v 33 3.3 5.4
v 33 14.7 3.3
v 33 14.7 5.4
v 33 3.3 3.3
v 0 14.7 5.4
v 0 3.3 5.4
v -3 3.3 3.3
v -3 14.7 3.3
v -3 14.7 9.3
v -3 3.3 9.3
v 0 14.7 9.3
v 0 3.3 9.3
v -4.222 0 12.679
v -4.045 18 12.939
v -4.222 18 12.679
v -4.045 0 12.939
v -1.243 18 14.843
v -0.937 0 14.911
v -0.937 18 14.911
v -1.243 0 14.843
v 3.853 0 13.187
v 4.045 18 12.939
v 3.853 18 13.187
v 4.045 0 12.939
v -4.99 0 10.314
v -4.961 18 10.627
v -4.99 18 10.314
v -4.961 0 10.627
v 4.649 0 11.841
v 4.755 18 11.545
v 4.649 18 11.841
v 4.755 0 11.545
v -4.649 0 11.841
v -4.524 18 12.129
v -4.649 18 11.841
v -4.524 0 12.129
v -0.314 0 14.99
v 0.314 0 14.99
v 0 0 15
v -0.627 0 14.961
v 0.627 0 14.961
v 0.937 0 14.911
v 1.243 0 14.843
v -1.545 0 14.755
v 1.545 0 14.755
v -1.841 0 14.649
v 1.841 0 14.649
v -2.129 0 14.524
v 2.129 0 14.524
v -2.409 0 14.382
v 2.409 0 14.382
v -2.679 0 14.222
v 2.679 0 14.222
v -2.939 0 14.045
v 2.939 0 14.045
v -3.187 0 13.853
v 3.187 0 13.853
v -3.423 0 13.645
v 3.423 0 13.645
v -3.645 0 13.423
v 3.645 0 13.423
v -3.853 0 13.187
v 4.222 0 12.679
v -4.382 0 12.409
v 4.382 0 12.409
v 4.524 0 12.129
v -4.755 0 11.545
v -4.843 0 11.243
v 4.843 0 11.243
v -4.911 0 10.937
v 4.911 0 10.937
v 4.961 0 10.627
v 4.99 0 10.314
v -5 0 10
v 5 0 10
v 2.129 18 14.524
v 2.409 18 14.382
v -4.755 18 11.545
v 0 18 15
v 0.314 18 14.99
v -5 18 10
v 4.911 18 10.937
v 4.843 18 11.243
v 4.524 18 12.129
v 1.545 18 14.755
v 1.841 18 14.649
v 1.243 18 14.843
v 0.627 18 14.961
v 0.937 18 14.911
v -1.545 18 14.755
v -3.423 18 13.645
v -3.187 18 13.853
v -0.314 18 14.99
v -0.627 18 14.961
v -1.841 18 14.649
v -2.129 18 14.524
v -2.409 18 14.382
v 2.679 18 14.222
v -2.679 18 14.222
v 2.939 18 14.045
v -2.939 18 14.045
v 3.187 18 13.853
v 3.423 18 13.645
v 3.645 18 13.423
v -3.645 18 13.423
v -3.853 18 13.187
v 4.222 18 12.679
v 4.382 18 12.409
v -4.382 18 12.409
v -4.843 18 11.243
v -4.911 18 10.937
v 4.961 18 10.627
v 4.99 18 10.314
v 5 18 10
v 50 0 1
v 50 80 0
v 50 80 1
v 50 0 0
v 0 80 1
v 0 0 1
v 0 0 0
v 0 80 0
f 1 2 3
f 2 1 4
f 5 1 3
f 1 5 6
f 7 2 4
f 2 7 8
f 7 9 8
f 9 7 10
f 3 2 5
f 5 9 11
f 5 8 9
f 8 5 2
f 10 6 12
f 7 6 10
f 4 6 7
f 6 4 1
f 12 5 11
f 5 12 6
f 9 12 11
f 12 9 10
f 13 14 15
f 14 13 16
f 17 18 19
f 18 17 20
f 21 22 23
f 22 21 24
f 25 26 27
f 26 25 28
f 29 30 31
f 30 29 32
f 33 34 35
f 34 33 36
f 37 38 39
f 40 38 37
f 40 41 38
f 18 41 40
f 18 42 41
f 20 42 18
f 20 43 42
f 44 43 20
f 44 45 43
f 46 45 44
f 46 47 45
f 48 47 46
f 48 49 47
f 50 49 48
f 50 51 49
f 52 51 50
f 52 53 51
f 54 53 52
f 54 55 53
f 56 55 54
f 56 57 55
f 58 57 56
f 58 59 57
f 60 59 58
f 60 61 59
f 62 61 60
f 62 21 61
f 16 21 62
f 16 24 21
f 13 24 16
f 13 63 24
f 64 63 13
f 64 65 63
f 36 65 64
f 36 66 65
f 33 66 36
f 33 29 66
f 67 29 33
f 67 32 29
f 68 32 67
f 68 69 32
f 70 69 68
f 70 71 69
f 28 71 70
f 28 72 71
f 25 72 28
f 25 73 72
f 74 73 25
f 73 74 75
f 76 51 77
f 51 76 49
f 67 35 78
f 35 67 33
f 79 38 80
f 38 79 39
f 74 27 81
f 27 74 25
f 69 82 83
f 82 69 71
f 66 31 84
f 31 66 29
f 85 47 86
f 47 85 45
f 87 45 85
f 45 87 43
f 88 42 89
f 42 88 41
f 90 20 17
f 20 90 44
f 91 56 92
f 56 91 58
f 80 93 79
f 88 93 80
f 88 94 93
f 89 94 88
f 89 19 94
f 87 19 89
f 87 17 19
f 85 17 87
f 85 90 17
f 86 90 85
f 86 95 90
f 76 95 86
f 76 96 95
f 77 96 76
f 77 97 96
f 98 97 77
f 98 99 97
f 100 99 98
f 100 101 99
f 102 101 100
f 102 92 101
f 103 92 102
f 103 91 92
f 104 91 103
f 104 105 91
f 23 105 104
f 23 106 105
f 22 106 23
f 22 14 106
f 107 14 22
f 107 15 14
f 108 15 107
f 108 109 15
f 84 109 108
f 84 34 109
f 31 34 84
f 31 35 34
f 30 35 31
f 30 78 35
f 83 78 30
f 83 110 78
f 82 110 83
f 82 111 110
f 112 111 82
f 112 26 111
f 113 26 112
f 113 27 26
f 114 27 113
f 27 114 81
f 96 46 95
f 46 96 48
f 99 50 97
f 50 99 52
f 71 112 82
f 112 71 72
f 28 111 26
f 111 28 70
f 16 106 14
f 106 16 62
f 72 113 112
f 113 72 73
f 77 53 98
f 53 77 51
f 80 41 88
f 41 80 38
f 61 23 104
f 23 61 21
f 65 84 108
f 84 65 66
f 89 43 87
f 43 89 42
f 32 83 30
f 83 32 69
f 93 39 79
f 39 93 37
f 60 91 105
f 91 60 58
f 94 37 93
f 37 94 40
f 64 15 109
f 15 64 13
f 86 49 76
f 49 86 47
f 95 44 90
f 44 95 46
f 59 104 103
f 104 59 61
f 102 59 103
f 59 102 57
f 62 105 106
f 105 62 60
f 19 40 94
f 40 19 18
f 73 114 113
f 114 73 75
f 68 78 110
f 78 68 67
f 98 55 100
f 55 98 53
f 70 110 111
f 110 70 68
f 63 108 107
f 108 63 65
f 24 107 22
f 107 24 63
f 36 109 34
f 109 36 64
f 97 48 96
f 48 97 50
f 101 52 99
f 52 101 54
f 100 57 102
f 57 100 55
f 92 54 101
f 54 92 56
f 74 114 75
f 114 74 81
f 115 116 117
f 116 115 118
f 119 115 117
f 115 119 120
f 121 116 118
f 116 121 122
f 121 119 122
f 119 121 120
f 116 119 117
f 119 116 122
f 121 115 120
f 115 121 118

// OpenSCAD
module outer_box(){
 	cube([6, 6, 0.5]);
 
	//right wall
 	translate([0, 0, .5])
 		cube([6, 0.5, 2.5]);
 	//left wall
 	translate([0, 5.5, .5])
 		cube([6, 0.5, 2.5]);

	//cover
 	translate([2, .5, 2])
 		cube([1, 5, 0.5]);
 }
 
 module inner_slide(){
 	color("blue")
 		translate([-1, 1.1, 1.1]){
 			cube([12, 3.8, 0.7]);
 			cube([1, 3.8, 2]);
 	}
 }
 
module pulley(){
 % outer_box();
 inner_slide();
}

scale([3, 3, 3])
	pulley();

//base
cube([50, 80, 1]);

translate([0, 0, 10]) rotate([-90, 0, 0])
difference(){
	cylinder(h=18, $fn=100, r=5);
	translate([-5, 0, -5]) cube([12, 10, 25]);
}
